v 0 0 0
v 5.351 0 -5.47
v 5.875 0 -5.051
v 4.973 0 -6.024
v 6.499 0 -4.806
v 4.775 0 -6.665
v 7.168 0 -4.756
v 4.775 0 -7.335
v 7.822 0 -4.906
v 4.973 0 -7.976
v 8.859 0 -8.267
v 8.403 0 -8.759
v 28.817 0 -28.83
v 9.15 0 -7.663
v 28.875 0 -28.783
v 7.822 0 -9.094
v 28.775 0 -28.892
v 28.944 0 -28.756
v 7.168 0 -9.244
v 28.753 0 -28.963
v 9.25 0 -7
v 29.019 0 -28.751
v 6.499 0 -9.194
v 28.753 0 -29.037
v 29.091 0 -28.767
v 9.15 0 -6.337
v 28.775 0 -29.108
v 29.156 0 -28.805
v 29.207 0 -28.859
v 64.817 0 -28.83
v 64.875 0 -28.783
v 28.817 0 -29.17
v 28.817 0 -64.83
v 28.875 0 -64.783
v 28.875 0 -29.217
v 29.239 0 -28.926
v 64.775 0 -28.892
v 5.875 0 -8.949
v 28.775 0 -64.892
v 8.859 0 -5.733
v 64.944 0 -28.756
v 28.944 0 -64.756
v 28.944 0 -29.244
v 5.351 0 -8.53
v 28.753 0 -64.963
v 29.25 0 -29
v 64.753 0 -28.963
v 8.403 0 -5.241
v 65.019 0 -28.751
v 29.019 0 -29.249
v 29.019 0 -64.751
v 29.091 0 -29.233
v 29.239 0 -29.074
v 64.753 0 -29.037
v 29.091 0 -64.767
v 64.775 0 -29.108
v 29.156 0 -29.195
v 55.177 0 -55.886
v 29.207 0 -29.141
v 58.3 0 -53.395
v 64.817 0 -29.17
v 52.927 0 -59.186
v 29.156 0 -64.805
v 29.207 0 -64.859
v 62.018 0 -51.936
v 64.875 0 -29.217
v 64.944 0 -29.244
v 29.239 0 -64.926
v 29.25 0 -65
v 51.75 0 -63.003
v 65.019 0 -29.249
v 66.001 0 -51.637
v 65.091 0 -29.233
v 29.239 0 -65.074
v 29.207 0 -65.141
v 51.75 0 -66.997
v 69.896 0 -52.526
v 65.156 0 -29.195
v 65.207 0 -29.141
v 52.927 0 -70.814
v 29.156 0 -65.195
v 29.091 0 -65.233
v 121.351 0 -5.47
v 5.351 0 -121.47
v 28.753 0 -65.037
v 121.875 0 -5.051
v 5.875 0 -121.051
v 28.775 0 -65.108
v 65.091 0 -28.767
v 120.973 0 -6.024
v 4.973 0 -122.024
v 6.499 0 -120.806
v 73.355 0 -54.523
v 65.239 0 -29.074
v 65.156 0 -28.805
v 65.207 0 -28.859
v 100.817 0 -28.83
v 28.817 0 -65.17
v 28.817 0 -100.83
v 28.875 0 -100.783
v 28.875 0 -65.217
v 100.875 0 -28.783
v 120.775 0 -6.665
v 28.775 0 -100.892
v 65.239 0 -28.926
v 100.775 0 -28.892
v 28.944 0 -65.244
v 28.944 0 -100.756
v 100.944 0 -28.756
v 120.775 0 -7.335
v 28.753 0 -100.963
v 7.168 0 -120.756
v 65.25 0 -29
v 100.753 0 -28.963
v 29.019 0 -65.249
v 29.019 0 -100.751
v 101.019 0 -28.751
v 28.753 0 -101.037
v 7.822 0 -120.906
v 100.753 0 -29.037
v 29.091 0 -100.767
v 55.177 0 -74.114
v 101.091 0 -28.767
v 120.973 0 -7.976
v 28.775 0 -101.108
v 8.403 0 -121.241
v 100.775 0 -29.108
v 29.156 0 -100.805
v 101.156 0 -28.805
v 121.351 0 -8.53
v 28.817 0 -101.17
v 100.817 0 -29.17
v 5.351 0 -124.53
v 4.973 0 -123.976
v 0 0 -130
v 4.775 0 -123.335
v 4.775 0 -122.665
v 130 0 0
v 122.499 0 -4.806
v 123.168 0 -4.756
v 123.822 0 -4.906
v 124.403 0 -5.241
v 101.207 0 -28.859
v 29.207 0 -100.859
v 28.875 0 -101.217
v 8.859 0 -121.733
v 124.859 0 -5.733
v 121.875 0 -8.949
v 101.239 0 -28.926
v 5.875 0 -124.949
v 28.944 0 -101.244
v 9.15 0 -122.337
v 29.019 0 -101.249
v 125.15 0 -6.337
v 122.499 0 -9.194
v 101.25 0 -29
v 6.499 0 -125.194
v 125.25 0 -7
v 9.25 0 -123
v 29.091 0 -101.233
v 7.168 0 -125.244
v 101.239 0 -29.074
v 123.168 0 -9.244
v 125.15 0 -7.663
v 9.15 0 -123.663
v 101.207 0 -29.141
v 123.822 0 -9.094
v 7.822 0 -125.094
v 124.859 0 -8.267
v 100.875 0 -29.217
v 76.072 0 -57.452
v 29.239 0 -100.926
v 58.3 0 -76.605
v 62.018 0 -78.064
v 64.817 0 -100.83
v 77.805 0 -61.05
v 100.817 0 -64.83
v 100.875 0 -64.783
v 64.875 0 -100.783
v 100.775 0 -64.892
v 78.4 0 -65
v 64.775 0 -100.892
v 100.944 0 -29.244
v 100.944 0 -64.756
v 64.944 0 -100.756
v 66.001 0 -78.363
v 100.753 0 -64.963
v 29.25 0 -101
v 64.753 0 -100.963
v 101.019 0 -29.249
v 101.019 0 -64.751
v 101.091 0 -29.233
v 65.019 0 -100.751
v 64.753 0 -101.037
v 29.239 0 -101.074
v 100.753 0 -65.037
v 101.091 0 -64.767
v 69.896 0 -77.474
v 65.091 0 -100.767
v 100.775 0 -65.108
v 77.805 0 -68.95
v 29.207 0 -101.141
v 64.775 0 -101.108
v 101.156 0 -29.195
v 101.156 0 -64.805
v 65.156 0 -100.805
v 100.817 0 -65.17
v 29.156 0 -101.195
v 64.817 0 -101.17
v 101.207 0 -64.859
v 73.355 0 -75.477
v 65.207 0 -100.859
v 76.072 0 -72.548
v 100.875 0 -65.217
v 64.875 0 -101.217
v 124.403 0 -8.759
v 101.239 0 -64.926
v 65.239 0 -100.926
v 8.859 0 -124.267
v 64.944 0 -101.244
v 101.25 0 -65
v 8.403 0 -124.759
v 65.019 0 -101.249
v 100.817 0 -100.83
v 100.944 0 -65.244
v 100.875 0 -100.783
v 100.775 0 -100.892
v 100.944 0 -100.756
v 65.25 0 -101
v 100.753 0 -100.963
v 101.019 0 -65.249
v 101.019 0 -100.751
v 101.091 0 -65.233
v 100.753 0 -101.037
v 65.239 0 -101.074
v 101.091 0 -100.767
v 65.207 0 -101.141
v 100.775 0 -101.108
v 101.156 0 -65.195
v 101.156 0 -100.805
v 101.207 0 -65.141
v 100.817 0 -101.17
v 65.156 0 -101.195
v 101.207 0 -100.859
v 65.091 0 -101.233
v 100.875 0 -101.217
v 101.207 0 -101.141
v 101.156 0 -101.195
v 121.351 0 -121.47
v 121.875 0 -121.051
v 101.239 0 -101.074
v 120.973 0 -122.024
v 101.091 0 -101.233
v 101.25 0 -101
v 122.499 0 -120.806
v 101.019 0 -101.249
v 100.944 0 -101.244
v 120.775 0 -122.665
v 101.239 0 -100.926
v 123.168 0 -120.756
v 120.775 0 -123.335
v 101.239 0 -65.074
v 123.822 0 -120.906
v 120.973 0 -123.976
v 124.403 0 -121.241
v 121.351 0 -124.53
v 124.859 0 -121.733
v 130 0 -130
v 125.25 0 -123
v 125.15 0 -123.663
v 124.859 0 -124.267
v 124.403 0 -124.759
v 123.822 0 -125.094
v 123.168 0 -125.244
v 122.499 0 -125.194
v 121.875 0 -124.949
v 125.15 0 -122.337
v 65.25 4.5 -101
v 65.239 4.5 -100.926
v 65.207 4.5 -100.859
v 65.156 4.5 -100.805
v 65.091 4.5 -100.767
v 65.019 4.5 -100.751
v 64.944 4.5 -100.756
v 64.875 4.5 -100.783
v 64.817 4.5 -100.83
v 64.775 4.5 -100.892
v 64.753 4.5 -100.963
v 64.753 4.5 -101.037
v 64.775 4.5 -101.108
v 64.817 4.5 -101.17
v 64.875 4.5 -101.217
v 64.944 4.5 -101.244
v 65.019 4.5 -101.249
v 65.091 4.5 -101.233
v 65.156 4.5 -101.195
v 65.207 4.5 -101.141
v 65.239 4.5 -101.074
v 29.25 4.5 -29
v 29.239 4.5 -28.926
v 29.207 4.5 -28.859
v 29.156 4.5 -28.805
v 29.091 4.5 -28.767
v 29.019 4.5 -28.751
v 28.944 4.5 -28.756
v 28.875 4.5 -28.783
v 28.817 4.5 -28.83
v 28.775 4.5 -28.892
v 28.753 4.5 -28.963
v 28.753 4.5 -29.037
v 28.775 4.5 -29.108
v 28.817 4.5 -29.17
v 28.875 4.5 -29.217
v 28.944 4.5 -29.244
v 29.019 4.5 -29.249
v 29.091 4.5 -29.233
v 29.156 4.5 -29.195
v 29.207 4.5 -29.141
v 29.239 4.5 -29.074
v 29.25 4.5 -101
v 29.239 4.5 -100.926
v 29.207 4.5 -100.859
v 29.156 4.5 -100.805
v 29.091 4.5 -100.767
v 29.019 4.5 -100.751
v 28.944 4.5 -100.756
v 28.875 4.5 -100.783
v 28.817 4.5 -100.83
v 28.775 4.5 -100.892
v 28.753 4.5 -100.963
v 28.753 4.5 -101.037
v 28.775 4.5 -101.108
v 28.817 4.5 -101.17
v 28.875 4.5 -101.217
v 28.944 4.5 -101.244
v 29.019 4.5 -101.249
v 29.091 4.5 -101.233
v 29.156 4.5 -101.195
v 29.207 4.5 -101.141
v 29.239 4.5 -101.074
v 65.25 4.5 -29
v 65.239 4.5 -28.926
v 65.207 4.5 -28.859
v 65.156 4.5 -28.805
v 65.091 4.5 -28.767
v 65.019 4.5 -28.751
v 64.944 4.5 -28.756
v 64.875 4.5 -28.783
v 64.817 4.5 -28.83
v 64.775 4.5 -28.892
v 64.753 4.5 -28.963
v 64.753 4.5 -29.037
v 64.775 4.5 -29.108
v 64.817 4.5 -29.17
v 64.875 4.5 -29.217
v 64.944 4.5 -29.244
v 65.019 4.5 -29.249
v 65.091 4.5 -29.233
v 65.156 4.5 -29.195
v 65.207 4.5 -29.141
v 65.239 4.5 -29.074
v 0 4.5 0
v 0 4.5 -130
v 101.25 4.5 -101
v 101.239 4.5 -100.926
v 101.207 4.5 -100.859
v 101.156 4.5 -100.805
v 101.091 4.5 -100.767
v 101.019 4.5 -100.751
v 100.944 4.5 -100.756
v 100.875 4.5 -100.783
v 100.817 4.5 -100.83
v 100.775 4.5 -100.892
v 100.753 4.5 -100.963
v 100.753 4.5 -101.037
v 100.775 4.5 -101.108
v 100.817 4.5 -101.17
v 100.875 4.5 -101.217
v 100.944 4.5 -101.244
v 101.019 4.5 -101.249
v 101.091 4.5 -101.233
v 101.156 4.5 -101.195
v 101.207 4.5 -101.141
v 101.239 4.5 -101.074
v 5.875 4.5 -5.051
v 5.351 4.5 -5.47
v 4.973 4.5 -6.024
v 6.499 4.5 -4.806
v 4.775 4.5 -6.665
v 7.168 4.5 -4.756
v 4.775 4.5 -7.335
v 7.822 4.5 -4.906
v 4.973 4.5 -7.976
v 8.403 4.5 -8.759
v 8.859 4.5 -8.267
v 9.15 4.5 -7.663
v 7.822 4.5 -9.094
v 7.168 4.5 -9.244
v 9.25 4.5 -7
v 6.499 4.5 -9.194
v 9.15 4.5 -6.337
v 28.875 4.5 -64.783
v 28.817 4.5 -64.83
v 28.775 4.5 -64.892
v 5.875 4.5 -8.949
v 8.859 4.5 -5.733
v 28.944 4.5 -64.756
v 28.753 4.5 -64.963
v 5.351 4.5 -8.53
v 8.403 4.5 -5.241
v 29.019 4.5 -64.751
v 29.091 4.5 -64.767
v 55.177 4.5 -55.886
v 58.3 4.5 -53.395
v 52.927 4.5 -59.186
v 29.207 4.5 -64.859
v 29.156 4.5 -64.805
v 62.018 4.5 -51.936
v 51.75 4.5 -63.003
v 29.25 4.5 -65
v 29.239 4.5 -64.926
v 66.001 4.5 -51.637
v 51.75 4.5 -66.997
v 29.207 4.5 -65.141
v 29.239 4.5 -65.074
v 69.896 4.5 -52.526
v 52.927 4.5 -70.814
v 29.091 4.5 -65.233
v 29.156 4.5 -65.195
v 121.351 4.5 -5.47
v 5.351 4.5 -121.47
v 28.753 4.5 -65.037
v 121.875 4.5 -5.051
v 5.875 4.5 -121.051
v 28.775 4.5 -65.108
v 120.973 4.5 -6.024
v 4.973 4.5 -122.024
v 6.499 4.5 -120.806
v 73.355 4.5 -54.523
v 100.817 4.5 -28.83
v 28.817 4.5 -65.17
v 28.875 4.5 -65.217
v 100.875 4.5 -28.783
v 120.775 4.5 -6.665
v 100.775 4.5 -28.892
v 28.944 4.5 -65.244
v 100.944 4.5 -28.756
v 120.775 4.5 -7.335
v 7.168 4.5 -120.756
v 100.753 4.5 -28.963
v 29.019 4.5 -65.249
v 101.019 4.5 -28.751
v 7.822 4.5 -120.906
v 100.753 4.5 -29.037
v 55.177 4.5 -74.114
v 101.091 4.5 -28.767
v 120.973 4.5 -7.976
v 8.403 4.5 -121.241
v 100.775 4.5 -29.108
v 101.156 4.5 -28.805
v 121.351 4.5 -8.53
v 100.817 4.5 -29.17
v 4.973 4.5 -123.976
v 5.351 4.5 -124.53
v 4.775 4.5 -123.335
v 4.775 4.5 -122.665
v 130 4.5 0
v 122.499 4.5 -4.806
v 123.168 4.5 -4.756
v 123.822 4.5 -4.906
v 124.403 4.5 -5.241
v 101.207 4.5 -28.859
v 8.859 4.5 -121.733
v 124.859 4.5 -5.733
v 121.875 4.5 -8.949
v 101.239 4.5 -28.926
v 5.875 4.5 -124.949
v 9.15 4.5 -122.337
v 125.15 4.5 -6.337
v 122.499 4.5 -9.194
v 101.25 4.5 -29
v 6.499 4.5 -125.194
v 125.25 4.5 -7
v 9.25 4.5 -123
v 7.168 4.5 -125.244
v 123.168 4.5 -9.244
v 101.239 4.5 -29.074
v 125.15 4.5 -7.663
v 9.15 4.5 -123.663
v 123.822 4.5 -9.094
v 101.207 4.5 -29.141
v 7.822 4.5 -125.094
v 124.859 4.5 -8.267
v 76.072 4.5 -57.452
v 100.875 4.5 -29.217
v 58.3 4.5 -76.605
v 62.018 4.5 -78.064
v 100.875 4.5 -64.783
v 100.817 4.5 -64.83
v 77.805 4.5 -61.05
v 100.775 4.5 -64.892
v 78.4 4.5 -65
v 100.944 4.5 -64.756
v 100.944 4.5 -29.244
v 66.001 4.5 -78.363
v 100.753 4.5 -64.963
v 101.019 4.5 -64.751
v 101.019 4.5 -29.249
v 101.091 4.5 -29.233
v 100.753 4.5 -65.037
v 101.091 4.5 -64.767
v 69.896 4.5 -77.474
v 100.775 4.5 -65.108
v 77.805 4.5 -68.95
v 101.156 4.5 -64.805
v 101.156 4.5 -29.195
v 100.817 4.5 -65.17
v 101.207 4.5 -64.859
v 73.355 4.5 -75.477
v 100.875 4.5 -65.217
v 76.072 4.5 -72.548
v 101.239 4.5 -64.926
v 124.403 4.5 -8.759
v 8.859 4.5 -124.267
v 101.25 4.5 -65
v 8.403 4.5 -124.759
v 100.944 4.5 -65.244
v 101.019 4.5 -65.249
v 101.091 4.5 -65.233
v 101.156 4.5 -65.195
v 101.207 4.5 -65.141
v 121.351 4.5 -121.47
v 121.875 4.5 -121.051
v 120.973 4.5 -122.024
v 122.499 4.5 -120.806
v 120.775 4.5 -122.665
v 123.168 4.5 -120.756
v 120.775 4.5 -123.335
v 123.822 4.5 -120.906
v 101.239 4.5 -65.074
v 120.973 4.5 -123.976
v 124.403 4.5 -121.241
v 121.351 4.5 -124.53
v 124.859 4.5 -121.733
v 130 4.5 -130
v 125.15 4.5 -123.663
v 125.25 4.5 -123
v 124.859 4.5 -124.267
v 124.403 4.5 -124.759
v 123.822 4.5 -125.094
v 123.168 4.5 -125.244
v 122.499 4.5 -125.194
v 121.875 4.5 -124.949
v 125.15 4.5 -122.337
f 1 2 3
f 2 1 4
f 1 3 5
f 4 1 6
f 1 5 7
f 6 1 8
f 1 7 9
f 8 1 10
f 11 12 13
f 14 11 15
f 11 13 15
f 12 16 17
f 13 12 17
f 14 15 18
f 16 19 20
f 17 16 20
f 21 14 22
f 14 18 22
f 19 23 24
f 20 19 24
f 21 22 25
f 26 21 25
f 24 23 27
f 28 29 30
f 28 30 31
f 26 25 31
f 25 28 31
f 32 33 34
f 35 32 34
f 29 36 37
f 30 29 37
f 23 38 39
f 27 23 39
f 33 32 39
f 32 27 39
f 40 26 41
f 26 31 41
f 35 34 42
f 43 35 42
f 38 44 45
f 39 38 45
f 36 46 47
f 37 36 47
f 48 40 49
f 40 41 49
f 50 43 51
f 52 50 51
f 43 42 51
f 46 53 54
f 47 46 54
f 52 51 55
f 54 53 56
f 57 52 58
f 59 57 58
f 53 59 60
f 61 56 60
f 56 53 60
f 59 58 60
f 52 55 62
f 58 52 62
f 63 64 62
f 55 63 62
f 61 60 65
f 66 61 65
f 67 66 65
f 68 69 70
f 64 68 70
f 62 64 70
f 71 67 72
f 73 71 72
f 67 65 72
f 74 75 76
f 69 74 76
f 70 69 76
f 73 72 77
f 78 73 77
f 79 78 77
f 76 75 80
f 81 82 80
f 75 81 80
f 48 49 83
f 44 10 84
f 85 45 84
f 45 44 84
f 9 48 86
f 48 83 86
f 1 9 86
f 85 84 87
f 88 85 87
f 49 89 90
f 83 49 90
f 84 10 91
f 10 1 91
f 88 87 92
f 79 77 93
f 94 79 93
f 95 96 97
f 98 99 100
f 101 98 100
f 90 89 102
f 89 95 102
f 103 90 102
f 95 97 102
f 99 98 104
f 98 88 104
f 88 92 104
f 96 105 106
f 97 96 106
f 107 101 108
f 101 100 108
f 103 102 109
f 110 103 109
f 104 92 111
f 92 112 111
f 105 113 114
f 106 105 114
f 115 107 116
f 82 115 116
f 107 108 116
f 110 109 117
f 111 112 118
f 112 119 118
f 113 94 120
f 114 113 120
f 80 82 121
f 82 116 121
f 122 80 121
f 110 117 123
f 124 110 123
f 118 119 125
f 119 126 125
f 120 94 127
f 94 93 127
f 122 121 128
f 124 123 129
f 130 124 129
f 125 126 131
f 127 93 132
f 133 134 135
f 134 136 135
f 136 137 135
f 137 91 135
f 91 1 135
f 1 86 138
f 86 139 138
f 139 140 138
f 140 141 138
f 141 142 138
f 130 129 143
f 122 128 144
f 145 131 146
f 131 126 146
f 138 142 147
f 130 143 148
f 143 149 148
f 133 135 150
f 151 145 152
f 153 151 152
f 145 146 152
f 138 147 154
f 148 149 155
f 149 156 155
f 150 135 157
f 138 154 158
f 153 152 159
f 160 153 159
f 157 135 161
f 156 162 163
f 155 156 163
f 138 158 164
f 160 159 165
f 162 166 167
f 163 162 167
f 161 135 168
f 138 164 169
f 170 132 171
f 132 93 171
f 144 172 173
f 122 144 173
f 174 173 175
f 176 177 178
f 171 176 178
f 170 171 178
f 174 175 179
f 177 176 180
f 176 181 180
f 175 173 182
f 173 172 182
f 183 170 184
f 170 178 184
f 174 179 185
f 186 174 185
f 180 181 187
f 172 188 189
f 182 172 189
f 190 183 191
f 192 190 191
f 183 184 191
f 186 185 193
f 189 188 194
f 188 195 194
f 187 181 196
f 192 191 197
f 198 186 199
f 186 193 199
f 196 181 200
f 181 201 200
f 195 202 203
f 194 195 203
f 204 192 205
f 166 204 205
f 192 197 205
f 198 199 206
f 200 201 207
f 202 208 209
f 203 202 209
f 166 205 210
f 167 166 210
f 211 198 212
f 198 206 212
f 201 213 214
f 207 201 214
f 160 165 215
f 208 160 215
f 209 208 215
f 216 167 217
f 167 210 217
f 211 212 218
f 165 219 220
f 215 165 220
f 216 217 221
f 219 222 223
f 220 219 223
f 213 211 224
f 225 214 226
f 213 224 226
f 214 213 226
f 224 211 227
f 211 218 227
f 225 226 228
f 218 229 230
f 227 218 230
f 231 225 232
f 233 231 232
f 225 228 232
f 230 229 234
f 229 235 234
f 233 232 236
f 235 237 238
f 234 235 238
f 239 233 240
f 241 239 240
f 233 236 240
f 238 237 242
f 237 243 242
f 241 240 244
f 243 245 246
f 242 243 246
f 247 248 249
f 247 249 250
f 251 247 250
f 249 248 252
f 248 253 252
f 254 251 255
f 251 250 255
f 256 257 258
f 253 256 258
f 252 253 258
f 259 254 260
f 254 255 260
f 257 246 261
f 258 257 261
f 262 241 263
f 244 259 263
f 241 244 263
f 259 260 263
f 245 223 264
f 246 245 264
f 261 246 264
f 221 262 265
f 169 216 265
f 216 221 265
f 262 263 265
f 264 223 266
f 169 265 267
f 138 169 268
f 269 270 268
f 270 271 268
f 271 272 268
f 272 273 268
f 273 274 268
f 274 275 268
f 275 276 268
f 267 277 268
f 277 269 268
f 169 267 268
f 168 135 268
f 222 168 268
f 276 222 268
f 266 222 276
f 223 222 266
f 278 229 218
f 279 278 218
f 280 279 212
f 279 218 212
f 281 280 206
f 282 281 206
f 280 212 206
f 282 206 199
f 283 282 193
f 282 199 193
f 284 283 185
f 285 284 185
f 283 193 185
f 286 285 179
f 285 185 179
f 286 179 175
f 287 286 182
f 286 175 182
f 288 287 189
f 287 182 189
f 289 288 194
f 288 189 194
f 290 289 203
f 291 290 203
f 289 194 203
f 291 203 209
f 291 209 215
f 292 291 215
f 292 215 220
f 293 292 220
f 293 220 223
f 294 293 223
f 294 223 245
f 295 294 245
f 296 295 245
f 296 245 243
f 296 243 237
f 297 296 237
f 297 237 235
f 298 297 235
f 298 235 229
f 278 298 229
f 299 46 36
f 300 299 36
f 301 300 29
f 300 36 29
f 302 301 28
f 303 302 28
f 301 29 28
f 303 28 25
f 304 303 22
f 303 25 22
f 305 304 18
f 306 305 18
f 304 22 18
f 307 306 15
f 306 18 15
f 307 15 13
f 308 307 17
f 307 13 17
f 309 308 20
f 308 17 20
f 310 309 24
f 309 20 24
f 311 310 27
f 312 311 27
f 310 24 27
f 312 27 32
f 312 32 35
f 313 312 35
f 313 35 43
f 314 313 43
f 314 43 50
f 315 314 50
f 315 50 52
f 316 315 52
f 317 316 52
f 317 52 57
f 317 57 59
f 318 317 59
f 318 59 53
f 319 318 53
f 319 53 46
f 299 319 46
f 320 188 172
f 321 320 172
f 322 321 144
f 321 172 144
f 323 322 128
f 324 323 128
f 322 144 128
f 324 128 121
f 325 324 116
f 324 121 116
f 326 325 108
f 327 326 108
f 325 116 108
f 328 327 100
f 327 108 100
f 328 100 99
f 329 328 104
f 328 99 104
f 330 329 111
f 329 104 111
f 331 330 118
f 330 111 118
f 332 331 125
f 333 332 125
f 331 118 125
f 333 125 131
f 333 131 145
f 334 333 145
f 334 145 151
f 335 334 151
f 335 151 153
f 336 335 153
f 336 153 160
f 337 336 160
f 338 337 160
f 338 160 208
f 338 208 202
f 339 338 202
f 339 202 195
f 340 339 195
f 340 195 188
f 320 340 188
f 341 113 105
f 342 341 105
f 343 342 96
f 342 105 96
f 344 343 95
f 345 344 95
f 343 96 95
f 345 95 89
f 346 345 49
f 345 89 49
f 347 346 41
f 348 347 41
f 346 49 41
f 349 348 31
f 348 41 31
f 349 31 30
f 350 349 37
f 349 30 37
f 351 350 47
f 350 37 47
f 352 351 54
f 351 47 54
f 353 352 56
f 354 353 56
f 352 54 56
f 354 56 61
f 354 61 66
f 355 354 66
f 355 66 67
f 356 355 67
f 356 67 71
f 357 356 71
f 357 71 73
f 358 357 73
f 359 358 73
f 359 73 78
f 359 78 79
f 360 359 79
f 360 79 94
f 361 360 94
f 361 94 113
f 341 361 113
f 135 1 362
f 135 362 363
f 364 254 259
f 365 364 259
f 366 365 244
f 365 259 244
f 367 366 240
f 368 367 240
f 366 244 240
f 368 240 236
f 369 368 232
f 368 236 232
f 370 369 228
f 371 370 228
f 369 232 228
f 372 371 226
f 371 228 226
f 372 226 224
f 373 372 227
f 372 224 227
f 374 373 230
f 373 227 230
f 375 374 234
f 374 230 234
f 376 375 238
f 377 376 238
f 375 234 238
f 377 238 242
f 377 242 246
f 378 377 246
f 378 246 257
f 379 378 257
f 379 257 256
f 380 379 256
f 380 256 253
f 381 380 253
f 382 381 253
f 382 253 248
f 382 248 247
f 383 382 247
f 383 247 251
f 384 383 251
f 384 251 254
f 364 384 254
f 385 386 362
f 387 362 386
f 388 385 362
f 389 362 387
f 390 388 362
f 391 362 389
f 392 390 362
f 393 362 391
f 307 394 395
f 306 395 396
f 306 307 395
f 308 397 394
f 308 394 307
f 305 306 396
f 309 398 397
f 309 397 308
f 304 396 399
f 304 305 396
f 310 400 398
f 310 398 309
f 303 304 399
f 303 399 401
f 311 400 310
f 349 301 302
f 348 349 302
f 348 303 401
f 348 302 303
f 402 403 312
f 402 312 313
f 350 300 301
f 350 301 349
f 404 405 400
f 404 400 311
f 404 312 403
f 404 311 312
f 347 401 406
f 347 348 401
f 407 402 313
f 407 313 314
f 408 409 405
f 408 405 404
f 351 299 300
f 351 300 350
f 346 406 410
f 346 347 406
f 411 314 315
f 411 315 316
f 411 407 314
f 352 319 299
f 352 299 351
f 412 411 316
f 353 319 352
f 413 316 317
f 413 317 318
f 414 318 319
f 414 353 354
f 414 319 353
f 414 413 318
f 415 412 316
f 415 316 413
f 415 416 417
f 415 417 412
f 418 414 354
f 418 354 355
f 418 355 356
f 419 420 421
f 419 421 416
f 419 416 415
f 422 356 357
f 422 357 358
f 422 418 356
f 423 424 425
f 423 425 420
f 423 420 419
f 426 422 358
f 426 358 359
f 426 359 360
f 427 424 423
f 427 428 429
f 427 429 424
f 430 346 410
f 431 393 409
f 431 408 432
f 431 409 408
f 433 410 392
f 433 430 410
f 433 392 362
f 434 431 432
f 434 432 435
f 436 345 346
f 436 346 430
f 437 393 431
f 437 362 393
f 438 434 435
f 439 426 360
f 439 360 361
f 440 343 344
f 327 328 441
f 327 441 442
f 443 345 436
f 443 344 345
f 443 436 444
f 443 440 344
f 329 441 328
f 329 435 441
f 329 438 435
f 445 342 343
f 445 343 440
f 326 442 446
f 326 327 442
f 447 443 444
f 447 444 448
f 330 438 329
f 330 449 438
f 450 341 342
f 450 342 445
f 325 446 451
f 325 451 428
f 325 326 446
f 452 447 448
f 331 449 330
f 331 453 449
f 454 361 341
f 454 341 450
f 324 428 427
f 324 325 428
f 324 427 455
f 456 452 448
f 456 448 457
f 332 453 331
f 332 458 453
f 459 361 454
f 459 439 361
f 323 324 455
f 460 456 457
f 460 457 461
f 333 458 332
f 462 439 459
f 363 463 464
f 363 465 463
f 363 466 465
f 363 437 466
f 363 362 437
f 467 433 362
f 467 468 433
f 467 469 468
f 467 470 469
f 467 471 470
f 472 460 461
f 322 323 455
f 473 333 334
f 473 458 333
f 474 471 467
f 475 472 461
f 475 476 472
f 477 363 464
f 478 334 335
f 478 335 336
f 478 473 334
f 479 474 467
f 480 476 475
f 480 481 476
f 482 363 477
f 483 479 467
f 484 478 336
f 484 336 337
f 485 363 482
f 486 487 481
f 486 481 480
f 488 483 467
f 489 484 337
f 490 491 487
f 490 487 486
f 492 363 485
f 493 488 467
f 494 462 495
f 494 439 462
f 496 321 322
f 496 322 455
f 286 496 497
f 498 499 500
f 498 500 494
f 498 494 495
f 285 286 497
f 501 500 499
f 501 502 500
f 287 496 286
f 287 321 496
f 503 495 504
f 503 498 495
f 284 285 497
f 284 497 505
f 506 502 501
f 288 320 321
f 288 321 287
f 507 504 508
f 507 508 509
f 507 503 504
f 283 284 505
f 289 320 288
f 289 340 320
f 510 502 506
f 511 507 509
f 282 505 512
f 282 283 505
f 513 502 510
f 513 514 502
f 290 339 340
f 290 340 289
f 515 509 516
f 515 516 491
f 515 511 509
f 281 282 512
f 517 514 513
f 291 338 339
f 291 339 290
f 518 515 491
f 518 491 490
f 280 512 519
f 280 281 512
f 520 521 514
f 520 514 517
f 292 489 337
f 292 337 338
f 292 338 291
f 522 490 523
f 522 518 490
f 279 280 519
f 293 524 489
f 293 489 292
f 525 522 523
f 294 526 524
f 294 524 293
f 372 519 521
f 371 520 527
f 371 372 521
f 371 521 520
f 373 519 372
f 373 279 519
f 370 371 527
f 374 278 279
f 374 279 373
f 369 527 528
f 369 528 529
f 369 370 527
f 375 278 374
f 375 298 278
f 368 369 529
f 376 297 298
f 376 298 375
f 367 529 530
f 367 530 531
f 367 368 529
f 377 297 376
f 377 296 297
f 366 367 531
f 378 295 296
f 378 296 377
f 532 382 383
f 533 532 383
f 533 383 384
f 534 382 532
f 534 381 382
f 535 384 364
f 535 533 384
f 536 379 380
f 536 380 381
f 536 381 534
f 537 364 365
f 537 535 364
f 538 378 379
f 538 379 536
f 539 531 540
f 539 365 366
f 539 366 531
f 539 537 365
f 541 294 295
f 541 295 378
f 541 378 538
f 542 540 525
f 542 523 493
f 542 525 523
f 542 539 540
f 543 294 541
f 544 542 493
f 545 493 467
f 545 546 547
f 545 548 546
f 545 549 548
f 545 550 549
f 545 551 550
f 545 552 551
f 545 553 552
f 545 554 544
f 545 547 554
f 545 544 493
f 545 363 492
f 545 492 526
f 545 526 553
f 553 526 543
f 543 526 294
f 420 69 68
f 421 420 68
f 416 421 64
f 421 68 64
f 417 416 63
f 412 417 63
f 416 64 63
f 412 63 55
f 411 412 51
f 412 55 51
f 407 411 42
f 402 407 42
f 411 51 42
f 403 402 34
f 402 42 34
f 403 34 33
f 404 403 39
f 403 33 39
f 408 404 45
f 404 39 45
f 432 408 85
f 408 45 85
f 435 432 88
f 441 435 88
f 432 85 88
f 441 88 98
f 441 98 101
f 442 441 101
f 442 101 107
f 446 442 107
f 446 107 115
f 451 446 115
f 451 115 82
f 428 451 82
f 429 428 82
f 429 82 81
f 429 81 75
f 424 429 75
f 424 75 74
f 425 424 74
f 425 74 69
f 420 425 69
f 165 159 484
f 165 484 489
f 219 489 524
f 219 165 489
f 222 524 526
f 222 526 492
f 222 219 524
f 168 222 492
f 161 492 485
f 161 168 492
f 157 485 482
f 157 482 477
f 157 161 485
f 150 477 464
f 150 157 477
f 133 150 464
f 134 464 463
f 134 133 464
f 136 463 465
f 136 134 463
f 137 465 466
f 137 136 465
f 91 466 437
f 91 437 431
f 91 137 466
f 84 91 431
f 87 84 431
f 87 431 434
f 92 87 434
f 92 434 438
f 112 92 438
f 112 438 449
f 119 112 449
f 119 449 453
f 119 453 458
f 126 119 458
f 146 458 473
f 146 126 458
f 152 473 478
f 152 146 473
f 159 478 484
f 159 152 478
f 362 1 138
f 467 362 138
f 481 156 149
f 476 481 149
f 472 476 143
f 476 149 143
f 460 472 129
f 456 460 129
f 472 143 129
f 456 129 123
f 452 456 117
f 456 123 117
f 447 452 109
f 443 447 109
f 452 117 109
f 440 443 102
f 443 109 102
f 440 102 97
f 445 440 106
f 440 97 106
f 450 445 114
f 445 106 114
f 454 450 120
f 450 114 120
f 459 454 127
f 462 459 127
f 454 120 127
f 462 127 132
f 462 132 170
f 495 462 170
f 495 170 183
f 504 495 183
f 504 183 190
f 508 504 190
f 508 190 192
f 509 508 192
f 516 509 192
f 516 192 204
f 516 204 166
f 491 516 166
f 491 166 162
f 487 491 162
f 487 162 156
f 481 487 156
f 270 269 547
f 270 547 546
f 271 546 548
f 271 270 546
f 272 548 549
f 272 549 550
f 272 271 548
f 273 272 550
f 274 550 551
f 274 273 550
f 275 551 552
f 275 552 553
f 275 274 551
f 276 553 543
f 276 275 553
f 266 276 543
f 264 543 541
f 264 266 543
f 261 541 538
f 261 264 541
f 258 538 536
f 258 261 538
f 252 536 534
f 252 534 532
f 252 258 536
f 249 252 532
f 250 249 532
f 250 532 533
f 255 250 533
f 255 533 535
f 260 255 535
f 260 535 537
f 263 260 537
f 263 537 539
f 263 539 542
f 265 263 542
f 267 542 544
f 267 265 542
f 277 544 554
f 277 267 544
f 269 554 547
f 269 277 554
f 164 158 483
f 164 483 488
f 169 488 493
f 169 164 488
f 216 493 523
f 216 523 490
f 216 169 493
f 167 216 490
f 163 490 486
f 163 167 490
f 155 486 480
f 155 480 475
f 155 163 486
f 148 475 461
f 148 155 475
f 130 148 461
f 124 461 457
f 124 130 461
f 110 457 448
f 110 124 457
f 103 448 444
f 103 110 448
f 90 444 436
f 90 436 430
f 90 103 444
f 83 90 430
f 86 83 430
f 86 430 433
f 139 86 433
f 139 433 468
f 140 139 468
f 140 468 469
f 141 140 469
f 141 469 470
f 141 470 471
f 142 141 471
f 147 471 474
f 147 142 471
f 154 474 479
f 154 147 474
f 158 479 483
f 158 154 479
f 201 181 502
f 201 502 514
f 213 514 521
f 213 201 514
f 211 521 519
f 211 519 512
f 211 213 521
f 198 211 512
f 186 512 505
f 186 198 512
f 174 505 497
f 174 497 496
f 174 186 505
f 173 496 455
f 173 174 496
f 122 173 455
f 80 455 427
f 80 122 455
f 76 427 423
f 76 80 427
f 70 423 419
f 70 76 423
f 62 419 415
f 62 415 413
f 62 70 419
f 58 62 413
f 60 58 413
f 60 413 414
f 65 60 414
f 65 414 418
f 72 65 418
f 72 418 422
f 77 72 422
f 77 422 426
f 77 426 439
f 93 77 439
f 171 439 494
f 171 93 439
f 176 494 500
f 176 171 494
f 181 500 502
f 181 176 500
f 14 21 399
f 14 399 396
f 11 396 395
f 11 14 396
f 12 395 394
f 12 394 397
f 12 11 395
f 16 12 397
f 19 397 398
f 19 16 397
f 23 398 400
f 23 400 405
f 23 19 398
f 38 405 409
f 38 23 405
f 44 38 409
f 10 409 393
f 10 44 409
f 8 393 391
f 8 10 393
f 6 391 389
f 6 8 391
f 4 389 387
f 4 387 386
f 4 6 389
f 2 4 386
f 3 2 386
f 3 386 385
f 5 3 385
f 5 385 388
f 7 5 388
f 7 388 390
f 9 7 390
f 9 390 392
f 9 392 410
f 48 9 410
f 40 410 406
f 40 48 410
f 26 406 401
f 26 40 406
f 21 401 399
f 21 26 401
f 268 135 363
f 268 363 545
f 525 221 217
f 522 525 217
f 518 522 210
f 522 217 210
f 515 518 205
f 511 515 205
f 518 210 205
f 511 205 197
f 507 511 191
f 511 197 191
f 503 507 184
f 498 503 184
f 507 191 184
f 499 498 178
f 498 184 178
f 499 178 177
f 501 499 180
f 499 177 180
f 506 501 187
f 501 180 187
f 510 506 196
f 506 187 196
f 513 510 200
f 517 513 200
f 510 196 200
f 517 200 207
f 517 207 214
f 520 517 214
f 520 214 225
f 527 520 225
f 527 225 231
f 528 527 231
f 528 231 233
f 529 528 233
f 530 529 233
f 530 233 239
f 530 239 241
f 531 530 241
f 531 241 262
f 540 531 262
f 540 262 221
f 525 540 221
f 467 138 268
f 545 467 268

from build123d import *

# Parameters (mm, degrees)
SKETCH1_W           = 130
SKETCH1_H           = 130
SKETCH1_R           = 13.4
SKETCH1_R_2         = 2.25
BOSS_EXTRUDE1_DEPTH = 4.5
SKETCH2_R           = 0.25
CUT_EXTRUDE1_DEPTH  = 5.5


with BuildPart() as part:
    # Sketch1 → Boss-Extrude1 (new body)
    with BuildSketch(Plane(origin=(0, 0, 0), x_dir=(1, 0, 0), z_dir=(0, 1, 0))):
        with Locations((65, 65)):
            Rectangle(SKETCH1_W, SKETCH1_H)
        with Locations((65, 65)):
            Circle(SKETCH1_R, mode=Mode.SUBTRACT)
        with Locations((123, 123)):
            Circle(SKETCH1_R_2, mode=Mode.SUBTRACT)
        with Locations((123, 7)):
            Circle(SKETCH1_R_2, mode=Mode.SUBTRACT)
        with Locations((7, 7)):
            Circle(SKETCH1_R_2, mode=Mode.SUBTRACT)
        with Locations((7, 123)):
            Circle(SKETCH1_R_2, mode=Mode.SUBTRACT)
    extrude(amount=BOSS_EXTRUDE1_DEPTH)

    # Sketch2 → Cut-Extrude1 (cut, through all)
    with BuildSketch(Plane.XZ):
        with Locations((29, -65)):
            Circle(SKETCH2_R)
        with Locations((65, -29)):
            Circle(SKETCH2_R)
        with Locations((101, -65)):
            Circle(SKETCH2_R)
        with Locations((65, -101)):
            Circle(SKETCH2_R)
        with Locations((101, -29)):
            Circle(SKETCH2_R)
        with Locations((29, -29)):
            Circle(SKETCH2_R)
        with Locations((101, -101)):
            Circle(SKETCH2_R)
        with Locations((29, -101)):
            Circle(SKETCH2_R)
    extrude(amount=-CUT_EXTRUDE1_DEPTH, mode=Mode.SUBTRACT)


solid = part.part
